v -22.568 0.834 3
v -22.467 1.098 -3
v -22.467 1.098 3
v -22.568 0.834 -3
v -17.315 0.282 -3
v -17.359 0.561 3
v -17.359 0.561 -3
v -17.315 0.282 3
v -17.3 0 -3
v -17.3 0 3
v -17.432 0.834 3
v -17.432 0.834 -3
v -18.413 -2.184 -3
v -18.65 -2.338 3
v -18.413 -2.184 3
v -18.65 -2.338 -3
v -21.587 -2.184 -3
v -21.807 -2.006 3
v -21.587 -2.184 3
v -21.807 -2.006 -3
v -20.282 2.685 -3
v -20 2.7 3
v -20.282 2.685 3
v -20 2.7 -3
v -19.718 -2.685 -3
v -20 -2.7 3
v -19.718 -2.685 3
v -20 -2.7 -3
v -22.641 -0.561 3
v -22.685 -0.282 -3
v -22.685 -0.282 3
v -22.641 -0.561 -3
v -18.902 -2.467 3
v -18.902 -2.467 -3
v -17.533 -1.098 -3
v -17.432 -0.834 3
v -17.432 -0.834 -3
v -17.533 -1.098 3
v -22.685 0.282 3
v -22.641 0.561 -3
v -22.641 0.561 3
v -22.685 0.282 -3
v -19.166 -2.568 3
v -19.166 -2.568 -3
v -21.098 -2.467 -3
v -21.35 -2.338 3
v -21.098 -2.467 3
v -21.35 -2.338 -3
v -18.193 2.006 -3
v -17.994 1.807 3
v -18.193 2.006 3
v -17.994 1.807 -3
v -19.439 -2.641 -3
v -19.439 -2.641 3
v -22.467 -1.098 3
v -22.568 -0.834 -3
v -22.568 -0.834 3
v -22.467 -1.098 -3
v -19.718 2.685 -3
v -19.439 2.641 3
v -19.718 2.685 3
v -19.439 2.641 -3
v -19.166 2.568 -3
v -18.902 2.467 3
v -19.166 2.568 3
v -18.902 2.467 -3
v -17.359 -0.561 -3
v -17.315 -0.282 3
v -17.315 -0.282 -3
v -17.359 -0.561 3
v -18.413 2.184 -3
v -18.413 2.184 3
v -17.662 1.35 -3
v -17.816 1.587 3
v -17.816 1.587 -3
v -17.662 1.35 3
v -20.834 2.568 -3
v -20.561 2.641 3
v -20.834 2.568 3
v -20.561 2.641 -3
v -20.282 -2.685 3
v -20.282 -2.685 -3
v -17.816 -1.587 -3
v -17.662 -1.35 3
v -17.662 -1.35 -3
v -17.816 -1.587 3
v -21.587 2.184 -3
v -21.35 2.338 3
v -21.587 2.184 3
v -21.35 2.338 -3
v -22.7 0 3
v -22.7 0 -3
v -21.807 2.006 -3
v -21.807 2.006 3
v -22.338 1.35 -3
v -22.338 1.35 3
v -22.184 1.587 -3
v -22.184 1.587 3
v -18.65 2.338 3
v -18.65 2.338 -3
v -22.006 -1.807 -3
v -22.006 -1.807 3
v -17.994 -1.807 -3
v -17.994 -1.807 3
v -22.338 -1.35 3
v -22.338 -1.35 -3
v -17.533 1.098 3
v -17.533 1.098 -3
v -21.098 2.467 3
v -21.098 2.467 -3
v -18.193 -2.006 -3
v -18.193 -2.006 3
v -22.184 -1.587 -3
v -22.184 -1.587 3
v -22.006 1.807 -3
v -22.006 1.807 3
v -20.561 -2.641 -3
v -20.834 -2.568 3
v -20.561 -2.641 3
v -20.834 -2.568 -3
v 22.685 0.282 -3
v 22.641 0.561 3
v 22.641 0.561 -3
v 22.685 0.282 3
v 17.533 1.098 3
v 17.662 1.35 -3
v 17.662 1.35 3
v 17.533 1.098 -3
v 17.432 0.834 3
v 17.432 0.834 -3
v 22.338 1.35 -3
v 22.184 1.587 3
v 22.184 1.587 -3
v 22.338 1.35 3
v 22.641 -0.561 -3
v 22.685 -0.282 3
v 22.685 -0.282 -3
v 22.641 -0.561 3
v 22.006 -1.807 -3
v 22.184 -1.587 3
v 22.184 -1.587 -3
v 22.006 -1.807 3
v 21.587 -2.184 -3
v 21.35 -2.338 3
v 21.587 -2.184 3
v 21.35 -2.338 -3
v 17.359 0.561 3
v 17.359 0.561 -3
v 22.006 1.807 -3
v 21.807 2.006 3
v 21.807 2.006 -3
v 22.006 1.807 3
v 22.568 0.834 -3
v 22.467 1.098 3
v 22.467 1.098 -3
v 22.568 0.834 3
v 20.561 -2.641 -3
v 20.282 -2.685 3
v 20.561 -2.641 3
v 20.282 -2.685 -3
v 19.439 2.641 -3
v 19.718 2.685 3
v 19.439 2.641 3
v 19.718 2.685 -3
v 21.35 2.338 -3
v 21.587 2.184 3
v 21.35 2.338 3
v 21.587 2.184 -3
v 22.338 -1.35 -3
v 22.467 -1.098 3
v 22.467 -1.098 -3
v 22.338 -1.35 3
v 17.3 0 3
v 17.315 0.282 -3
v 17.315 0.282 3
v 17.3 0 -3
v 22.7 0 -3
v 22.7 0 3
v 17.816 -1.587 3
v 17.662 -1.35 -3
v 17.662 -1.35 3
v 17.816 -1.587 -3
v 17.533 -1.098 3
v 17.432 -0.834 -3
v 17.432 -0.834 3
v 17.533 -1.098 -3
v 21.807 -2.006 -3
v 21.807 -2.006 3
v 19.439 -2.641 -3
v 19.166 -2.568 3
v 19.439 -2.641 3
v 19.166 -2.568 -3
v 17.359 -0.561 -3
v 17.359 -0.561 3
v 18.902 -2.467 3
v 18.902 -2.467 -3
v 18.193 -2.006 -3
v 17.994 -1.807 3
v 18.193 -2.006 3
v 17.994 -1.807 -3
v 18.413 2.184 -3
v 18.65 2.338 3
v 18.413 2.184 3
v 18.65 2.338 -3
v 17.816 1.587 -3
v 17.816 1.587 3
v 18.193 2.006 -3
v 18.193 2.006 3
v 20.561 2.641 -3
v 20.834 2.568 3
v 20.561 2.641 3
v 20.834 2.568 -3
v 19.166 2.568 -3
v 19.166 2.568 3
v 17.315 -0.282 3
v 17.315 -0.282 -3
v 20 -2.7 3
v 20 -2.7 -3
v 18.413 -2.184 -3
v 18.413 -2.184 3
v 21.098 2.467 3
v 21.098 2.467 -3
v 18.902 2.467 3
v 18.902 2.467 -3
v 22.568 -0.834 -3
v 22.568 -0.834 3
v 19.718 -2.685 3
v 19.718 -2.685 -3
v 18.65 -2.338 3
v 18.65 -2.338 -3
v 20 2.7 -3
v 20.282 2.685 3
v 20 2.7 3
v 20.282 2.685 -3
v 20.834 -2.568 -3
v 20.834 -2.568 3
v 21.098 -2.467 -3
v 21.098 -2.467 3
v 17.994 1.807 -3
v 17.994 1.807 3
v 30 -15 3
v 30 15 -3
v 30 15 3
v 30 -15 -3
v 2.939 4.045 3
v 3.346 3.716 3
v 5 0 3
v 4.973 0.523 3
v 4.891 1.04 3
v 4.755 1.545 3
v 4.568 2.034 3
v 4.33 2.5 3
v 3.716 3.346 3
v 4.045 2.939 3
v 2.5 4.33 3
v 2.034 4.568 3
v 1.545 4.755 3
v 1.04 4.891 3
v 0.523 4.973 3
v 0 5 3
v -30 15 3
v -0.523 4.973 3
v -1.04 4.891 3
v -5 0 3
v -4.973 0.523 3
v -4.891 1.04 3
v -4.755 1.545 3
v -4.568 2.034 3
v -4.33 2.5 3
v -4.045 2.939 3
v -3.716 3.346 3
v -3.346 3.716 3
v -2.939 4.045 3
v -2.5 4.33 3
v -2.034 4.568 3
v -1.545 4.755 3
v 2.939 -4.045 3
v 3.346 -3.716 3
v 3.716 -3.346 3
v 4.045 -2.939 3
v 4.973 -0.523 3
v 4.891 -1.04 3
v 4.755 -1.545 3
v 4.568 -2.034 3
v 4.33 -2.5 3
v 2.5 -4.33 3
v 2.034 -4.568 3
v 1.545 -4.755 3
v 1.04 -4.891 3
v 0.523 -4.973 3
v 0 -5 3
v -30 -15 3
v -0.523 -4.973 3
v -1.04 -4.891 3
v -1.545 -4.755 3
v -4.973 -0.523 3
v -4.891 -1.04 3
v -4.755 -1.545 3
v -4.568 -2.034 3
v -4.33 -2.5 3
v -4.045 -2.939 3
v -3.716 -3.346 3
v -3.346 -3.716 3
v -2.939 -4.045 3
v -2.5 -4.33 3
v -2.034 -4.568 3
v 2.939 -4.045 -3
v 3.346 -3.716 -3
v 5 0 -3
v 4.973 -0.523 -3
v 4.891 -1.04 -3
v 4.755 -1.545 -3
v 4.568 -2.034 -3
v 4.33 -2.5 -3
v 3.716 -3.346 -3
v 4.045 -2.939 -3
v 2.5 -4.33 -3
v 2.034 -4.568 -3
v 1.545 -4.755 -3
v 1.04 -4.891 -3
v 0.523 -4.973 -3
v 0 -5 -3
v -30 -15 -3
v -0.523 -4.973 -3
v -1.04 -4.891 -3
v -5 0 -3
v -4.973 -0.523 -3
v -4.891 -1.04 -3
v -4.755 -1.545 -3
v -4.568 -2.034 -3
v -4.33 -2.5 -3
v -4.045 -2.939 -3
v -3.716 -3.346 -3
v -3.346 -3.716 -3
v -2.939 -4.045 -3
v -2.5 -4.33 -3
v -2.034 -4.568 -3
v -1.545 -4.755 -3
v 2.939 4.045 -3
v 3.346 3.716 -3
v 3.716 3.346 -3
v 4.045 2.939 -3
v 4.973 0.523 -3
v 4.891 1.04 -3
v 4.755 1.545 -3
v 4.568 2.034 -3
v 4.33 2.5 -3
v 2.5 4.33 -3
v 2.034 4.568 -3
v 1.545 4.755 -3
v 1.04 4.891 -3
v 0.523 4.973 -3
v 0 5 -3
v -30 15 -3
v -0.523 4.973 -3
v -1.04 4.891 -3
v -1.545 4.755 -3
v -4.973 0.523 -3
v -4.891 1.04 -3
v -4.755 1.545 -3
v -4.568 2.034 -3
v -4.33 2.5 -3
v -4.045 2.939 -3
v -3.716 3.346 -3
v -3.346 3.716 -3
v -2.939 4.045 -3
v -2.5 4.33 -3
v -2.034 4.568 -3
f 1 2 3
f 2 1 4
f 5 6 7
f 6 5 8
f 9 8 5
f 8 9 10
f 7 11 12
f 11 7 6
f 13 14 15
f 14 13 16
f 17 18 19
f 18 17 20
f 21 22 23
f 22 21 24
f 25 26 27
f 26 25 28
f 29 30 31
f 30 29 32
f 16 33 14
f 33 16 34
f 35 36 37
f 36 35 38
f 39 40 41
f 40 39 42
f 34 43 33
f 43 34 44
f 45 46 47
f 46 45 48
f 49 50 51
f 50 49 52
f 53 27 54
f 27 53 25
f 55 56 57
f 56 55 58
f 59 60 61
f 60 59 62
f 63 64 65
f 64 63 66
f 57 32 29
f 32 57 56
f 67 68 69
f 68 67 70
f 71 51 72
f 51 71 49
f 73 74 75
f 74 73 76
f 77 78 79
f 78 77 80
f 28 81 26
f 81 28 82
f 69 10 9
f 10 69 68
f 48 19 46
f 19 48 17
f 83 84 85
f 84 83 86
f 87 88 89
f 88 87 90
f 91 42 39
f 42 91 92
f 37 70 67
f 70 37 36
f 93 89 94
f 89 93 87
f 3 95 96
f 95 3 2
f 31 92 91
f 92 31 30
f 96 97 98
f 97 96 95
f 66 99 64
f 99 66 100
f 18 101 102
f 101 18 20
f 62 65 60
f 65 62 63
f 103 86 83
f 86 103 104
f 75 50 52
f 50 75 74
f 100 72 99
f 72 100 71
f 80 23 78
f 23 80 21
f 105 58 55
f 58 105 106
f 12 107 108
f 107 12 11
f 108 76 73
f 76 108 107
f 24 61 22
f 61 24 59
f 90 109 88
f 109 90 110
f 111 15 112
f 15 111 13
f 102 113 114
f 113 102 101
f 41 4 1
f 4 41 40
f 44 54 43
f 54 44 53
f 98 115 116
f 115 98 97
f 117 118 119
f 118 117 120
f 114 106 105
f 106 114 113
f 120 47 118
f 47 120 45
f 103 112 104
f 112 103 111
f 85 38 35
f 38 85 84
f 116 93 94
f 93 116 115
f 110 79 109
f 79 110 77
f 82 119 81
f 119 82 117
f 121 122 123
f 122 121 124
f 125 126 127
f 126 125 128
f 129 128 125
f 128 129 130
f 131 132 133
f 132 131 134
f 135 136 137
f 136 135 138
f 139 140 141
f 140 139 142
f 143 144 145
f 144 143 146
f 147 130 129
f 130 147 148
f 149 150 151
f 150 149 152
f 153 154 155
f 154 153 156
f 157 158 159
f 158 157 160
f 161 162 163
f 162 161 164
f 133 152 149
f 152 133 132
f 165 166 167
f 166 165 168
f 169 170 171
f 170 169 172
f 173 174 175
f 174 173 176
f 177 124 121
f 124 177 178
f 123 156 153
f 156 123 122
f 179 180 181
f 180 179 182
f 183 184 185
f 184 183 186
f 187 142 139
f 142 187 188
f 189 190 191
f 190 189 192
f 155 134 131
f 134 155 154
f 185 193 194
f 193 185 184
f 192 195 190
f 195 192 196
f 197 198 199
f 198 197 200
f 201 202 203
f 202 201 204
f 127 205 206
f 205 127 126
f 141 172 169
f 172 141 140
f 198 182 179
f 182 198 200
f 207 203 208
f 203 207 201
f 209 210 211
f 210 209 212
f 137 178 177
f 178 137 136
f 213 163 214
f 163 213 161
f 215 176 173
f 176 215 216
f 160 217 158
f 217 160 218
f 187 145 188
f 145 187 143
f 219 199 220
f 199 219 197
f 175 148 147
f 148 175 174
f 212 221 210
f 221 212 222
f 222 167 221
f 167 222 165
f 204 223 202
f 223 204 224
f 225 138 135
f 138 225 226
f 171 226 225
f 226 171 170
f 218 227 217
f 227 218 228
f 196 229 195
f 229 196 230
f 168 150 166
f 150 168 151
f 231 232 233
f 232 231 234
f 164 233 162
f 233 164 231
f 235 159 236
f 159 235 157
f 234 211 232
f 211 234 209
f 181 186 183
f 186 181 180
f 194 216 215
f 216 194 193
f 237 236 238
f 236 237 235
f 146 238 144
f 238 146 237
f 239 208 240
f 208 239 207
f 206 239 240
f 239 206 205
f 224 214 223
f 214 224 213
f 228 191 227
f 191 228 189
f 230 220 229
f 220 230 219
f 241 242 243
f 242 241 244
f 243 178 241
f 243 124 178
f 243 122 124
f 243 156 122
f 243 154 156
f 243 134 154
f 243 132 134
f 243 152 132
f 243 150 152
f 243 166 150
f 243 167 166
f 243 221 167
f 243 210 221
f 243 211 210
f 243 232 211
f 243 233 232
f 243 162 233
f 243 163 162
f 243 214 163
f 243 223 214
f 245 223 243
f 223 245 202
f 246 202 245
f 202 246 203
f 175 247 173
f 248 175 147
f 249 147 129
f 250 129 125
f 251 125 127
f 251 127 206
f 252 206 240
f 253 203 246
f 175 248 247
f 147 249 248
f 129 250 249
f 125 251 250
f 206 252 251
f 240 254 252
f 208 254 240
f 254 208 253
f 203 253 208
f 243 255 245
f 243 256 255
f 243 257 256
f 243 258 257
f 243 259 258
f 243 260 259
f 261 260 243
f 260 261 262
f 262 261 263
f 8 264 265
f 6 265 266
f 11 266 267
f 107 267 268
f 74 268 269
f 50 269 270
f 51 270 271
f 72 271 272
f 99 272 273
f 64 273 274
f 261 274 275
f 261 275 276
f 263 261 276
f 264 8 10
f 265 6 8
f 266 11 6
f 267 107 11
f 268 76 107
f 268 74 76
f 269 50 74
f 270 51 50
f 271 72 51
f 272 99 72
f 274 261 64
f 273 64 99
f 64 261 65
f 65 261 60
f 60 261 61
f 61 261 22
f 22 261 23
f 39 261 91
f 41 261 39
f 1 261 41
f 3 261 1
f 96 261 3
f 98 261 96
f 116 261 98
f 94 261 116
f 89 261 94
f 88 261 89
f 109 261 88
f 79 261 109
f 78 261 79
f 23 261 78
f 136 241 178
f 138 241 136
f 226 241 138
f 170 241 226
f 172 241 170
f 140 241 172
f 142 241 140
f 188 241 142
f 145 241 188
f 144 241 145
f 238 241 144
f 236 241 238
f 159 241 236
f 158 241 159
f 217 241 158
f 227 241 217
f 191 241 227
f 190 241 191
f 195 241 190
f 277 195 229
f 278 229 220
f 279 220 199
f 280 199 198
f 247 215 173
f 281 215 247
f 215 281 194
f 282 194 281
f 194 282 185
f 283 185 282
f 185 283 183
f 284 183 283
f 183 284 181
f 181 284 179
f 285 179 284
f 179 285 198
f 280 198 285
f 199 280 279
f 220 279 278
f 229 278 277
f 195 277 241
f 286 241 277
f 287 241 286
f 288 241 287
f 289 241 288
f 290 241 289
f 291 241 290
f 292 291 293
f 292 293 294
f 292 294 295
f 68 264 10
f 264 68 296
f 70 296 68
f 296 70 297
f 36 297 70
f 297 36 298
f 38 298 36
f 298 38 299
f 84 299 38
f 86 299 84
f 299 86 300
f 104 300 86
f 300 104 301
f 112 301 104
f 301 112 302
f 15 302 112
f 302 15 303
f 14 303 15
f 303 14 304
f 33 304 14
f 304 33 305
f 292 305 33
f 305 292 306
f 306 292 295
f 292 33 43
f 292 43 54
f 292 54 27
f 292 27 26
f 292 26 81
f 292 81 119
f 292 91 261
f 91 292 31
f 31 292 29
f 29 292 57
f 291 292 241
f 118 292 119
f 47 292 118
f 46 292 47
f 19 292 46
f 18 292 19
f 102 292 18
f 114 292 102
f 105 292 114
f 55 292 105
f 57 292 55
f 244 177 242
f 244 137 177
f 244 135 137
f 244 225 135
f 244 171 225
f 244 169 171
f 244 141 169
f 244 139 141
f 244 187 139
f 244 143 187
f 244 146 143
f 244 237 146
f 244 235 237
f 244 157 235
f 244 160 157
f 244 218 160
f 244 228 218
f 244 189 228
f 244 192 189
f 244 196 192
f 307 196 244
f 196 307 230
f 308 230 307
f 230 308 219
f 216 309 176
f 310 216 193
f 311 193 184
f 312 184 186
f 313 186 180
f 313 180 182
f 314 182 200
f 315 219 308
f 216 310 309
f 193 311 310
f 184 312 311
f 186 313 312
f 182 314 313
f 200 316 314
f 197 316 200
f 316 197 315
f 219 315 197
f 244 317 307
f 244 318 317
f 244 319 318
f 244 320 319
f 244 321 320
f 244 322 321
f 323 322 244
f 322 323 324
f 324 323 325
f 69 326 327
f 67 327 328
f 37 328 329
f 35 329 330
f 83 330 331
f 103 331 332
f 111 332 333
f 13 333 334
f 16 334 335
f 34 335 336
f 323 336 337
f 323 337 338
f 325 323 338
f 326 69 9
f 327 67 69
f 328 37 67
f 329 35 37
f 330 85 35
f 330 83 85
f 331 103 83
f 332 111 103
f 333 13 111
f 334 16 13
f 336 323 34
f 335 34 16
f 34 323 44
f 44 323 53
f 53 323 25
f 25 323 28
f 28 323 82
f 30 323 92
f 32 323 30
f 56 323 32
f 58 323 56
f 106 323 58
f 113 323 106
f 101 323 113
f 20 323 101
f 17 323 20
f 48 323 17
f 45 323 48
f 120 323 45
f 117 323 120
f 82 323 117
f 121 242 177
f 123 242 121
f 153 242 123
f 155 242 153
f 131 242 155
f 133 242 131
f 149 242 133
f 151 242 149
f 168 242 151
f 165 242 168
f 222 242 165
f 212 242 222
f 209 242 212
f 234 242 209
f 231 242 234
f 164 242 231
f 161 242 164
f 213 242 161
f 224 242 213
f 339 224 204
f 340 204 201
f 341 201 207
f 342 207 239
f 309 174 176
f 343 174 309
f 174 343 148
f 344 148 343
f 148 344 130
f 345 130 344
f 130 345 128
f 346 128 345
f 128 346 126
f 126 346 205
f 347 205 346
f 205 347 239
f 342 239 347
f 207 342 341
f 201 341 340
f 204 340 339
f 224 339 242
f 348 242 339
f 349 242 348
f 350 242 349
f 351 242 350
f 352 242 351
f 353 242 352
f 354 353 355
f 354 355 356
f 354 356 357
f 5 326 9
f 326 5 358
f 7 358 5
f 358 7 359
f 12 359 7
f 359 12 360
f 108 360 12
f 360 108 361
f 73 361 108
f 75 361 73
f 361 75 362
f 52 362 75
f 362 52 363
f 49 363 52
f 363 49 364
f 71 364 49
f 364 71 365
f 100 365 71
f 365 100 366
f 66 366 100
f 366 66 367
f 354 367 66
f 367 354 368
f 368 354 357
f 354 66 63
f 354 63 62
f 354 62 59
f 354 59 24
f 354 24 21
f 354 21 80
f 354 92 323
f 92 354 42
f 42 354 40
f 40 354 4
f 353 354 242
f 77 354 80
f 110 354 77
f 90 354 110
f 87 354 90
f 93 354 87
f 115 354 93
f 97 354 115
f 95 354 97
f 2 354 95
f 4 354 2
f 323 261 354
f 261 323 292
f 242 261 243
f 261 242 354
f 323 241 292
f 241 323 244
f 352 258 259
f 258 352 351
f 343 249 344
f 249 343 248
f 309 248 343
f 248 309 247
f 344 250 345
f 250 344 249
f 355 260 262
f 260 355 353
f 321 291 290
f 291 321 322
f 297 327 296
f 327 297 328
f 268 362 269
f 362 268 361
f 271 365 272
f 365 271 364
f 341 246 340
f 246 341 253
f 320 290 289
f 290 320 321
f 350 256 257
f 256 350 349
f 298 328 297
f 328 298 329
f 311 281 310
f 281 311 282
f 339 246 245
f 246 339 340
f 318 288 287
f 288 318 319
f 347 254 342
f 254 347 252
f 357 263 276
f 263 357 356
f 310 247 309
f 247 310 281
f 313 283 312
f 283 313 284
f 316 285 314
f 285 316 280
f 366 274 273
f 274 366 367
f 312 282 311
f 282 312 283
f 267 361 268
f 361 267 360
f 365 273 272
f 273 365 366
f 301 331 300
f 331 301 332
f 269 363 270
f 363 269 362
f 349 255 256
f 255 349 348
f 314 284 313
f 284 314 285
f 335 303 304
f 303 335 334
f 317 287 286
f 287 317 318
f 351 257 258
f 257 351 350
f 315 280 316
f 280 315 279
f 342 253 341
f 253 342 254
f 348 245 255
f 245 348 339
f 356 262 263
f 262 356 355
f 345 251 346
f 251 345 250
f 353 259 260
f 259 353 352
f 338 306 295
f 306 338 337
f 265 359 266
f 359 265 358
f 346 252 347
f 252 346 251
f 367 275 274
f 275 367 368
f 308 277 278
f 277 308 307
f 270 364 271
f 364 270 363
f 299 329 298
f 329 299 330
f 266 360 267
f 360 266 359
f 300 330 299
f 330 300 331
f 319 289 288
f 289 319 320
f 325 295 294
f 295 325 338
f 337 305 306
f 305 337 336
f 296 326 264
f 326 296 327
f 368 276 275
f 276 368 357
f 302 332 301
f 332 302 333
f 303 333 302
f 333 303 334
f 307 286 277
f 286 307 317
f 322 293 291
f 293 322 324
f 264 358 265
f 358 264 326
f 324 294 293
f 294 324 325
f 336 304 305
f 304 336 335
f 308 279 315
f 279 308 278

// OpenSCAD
// Rod-end mounting plate.
$fn = 60;
eps = 0.02;
plate_l = 60;
plate_w = 30;
plate_t = 6;
bore_d = 10;
difference() {
    cube([plate_l, plate_w, plate_t], center = true);
    translate([0, 0, -plate_t / 2 - eps]) cylinder(d = bore_d, h = plate_t + 2 * eps);
    for (x = [-plate_l / 2 + 10, plate_l / 2 - 10])
        translate([x, 0, -plate_t / 2 - eps]) cylinder(d = 5.4, h = plate_t + 2 * eps);
}
